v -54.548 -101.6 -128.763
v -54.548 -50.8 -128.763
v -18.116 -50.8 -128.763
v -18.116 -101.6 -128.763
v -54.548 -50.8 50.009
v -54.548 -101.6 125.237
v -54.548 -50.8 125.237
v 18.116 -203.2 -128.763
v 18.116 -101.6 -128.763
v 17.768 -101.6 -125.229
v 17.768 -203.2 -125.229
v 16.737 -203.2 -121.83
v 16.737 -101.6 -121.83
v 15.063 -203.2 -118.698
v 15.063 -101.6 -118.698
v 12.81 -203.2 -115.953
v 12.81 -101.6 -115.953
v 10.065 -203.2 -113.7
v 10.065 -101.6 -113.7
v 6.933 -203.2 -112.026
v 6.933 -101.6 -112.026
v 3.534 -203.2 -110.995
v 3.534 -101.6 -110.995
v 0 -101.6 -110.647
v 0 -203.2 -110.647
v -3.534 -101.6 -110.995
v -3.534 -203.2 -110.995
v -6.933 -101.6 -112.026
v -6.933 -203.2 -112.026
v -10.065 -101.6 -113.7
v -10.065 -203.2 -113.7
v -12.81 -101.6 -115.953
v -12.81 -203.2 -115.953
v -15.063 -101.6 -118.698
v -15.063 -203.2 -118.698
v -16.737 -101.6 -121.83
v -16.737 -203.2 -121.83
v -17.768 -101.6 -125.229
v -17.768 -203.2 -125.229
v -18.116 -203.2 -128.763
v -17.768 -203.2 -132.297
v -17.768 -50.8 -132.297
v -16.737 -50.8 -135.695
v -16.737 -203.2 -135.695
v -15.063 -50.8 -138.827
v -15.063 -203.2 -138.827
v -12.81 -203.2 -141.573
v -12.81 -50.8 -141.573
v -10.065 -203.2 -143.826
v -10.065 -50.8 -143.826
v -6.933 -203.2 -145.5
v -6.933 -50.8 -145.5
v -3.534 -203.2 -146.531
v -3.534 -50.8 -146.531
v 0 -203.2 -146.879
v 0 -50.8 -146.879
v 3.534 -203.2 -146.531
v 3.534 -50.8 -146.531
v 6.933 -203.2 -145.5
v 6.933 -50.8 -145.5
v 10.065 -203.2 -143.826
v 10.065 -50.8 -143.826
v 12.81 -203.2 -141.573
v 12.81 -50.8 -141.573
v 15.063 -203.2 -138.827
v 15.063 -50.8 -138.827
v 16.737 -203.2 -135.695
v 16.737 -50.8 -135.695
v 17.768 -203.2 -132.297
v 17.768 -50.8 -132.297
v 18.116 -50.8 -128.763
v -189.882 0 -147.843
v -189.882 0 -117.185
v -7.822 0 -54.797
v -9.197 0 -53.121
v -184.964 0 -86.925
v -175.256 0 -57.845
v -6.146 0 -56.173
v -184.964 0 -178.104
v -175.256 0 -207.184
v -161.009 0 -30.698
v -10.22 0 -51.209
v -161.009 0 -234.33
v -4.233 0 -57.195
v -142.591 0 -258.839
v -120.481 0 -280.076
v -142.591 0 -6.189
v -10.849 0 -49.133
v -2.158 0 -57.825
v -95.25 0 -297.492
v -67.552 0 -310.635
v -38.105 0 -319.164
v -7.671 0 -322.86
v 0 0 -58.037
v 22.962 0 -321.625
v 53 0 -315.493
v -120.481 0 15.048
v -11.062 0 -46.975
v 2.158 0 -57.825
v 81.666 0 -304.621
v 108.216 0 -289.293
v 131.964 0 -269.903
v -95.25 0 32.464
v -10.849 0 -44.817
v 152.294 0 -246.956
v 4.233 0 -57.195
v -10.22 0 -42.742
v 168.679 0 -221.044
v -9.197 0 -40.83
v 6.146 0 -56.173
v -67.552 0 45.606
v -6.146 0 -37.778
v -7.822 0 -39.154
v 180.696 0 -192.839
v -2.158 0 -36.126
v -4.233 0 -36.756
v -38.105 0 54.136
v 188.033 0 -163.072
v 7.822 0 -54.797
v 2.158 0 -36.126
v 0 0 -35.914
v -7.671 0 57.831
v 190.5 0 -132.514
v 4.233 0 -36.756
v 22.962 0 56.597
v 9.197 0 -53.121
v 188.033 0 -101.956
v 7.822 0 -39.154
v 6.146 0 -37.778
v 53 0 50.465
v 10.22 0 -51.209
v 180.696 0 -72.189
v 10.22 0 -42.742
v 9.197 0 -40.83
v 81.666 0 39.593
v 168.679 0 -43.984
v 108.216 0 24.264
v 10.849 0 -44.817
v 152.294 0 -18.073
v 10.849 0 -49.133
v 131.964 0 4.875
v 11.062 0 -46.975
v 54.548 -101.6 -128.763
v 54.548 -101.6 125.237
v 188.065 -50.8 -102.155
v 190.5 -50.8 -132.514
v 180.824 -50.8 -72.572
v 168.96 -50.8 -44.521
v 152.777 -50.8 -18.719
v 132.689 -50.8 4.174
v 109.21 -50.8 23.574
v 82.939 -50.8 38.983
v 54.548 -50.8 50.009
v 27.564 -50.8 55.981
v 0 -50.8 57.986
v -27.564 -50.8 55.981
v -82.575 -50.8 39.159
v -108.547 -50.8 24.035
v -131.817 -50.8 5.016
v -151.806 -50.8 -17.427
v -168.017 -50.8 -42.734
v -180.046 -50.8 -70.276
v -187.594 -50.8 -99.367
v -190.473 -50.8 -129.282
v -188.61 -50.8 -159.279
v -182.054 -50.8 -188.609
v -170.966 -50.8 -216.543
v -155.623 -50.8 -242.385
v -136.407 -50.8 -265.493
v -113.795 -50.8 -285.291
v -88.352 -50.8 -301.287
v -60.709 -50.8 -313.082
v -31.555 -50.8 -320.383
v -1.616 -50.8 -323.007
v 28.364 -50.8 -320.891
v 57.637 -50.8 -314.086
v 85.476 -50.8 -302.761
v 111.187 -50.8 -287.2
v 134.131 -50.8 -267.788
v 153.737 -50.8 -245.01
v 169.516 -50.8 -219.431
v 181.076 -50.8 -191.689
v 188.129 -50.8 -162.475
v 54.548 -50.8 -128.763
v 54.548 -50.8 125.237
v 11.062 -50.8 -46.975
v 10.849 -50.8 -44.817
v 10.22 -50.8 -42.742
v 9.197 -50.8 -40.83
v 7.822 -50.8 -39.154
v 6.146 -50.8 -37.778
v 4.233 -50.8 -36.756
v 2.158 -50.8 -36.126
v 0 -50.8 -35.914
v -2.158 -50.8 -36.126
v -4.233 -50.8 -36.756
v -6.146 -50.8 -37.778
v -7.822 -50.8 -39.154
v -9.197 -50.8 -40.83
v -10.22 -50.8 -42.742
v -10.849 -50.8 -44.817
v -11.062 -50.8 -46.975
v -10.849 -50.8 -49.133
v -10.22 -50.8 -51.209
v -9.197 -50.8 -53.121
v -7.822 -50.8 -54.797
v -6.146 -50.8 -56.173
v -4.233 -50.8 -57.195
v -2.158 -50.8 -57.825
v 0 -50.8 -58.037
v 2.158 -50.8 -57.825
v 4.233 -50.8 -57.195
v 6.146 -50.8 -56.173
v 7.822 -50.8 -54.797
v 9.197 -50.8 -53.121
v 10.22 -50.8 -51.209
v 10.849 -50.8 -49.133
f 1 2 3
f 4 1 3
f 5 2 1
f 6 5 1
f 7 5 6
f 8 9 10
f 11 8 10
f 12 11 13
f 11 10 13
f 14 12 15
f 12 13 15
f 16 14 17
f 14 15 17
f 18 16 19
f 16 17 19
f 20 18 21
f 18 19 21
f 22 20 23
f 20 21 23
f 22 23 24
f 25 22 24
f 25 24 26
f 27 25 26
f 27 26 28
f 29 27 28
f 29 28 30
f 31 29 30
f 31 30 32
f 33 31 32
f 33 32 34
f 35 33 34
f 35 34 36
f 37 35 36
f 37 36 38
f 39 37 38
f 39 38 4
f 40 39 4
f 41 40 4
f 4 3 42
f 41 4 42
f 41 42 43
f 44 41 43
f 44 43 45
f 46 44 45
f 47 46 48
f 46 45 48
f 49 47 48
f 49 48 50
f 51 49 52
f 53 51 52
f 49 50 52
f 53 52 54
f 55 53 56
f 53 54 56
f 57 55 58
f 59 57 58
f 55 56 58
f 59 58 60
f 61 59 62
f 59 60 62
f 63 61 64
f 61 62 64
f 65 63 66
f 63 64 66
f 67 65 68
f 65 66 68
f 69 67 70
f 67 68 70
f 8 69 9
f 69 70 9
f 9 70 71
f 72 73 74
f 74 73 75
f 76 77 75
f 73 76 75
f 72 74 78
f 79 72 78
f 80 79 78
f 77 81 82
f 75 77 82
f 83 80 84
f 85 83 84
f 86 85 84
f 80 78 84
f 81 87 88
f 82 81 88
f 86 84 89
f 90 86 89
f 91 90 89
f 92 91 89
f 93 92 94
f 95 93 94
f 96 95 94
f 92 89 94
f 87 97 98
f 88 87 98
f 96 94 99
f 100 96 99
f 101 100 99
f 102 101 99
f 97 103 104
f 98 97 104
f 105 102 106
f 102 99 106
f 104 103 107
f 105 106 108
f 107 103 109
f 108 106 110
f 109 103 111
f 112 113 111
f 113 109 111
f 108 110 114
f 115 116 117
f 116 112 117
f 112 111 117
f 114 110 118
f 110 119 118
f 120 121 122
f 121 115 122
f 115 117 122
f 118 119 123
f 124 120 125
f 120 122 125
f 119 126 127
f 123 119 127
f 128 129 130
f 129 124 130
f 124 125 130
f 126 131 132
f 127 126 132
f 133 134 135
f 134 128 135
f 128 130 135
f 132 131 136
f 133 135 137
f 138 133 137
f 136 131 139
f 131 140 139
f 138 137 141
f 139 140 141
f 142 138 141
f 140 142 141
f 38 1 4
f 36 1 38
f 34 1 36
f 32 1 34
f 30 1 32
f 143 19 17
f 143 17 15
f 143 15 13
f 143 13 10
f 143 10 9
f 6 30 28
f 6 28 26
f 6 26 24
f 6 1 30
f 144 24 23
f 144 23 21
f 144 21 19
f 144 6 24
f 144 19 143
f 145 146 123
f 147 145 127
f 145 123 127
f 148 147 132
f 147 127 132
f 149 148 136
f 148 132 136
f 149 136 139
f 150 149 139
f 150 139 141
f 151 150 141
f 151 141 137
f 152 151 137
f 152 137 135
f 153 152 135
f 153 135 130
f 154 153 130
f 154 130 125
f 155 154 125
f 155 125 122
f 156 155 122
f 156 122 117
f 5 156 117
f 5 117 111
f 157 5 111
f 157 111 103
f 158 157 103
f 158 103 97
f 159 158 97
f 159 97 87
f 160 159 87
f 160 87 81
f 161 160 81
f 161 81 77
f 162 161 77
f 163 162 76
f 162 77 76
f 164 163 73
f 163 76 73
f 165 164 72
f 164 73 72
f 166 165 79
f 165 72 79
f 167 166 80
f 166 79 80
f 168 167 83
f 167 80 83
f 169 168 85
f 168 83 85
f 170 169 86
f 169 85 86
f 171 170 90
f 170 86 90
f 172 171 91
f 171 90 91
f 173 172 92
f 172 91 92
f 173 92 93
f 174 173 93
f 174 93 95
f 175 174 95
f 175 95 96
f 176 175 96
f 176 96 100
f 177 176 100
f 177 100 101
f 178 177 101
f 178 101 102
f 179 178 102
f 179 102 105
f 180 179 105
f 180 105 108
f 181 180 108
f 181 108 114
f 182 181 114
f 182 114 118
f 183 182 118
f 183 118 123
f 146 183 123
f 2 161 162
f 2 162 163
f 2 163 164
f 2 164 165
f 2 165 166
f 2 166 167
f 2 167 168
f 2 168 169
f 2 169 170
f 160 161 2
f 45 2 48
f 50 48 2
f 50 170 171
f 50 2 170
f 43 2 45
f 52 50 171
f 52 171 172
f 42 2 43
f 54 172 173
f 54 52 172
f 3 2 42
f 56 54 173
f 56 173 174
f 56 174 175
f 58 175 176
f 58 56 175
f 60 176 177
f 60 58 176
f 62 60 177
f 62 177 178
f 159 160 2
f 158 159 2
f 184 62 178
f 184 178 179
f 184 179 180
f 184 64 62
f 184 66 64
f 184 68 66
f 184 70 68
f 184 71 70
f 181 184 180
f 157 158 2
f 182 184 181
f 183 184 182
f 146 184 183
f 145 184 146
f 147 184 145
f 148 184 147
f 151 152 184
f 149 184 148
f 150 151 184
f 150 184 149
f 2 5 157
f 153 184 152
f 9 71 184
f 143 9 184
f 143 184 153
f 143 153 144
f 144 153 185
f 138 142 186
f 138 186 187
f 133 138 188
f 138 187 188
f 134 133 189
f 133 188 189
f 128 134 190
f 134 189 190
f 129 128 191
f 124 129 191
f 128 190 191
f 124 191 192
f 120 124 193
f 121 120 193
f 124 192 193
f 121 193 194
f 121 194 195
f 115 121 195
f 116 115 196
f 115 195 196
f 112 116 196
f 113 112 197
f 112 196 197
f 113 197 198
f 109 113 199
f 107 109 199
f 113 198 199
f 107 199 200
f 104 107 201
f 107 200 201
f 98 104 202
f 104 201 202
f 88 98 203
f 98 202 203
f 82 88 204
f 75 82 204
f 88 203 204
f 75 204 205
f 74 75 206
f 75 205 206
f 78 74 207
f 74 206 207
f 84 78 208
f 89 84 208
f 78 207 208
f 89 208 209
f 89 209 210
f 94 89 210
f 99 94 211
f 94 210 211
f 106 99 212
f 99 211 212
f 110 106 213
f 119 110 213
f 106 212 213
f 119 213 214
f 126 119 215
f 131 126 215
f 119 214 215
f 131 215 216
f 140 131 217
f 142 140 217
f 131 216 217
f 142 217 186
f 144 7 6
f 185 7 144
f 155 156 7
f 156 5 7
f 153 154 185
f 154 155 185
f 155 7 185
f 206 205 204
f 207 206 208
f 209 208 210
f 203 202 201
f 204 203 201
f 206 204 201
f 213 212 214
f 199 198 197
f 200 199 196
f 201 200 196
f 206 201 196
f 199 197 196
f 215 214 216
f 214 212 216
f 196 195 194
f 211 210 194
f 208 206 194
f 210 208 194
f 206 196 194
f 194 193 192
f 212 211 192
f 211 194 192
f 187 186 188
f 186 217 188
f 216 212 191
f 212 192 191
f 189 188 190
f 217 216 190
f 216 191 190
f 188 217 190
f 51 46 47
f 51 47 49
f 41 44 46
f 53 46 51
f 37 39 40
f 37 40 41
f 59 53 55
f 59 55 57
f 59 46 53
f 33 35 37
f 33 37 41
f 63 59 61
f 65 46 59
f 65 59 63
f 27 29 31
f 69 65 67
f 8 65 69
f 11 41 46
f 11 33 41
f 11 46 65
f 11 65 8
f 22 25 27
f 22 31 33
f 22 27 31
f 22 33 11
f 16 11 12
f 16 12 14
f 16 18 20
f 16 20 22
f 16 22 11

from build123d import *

# Parameters (mm, degrees)
F0_R     = 190.5
F1_DEPTH = 50.8
F2_R     = 11.061729
F3_DEPTH = 50.8
F4_W     = 109.096915
F4_H     = 254
F5_DEPTH = 50.8
F6_R     = 18.115742
F7_DEPTH = 152.4


with BuildPart() as f1:
    # F0 (on Front) → F1 (new body)
    with BuildSketch(Plane.XZ):
        with Locations((0, -132.514146)):
            Circle(F0_R)
    extrude(amount=F1_DEPTH)

    # F2 (on face) → F3 (cut)
    with BuildSketch(Plane.XZ.offset(50.8)):
        with Locations((0, -46.975374)):
            Circle(F2_R)
    extrude(amount=-F3_DEPTH, mode=Mode.SUBTRACT)

    # F4 (on face) → F5 (join)
    with BuildSketch(Plane.XZ.offset(50.8)):
        with Locations((-1e-06, -1.762878)):
            Rectangle(F4_W, F4_H)
    extrude(amount=F5_DEPTH)

    # F6 (on face) → F7 (join)
    with BuildSketch(Plane.XZ.offset(50.8)):
        with Locations((-2e-06, -128.762878)):
            Circle(F6_R)
    extrude(amount=F7_DEPTH)


solid = f1.part
